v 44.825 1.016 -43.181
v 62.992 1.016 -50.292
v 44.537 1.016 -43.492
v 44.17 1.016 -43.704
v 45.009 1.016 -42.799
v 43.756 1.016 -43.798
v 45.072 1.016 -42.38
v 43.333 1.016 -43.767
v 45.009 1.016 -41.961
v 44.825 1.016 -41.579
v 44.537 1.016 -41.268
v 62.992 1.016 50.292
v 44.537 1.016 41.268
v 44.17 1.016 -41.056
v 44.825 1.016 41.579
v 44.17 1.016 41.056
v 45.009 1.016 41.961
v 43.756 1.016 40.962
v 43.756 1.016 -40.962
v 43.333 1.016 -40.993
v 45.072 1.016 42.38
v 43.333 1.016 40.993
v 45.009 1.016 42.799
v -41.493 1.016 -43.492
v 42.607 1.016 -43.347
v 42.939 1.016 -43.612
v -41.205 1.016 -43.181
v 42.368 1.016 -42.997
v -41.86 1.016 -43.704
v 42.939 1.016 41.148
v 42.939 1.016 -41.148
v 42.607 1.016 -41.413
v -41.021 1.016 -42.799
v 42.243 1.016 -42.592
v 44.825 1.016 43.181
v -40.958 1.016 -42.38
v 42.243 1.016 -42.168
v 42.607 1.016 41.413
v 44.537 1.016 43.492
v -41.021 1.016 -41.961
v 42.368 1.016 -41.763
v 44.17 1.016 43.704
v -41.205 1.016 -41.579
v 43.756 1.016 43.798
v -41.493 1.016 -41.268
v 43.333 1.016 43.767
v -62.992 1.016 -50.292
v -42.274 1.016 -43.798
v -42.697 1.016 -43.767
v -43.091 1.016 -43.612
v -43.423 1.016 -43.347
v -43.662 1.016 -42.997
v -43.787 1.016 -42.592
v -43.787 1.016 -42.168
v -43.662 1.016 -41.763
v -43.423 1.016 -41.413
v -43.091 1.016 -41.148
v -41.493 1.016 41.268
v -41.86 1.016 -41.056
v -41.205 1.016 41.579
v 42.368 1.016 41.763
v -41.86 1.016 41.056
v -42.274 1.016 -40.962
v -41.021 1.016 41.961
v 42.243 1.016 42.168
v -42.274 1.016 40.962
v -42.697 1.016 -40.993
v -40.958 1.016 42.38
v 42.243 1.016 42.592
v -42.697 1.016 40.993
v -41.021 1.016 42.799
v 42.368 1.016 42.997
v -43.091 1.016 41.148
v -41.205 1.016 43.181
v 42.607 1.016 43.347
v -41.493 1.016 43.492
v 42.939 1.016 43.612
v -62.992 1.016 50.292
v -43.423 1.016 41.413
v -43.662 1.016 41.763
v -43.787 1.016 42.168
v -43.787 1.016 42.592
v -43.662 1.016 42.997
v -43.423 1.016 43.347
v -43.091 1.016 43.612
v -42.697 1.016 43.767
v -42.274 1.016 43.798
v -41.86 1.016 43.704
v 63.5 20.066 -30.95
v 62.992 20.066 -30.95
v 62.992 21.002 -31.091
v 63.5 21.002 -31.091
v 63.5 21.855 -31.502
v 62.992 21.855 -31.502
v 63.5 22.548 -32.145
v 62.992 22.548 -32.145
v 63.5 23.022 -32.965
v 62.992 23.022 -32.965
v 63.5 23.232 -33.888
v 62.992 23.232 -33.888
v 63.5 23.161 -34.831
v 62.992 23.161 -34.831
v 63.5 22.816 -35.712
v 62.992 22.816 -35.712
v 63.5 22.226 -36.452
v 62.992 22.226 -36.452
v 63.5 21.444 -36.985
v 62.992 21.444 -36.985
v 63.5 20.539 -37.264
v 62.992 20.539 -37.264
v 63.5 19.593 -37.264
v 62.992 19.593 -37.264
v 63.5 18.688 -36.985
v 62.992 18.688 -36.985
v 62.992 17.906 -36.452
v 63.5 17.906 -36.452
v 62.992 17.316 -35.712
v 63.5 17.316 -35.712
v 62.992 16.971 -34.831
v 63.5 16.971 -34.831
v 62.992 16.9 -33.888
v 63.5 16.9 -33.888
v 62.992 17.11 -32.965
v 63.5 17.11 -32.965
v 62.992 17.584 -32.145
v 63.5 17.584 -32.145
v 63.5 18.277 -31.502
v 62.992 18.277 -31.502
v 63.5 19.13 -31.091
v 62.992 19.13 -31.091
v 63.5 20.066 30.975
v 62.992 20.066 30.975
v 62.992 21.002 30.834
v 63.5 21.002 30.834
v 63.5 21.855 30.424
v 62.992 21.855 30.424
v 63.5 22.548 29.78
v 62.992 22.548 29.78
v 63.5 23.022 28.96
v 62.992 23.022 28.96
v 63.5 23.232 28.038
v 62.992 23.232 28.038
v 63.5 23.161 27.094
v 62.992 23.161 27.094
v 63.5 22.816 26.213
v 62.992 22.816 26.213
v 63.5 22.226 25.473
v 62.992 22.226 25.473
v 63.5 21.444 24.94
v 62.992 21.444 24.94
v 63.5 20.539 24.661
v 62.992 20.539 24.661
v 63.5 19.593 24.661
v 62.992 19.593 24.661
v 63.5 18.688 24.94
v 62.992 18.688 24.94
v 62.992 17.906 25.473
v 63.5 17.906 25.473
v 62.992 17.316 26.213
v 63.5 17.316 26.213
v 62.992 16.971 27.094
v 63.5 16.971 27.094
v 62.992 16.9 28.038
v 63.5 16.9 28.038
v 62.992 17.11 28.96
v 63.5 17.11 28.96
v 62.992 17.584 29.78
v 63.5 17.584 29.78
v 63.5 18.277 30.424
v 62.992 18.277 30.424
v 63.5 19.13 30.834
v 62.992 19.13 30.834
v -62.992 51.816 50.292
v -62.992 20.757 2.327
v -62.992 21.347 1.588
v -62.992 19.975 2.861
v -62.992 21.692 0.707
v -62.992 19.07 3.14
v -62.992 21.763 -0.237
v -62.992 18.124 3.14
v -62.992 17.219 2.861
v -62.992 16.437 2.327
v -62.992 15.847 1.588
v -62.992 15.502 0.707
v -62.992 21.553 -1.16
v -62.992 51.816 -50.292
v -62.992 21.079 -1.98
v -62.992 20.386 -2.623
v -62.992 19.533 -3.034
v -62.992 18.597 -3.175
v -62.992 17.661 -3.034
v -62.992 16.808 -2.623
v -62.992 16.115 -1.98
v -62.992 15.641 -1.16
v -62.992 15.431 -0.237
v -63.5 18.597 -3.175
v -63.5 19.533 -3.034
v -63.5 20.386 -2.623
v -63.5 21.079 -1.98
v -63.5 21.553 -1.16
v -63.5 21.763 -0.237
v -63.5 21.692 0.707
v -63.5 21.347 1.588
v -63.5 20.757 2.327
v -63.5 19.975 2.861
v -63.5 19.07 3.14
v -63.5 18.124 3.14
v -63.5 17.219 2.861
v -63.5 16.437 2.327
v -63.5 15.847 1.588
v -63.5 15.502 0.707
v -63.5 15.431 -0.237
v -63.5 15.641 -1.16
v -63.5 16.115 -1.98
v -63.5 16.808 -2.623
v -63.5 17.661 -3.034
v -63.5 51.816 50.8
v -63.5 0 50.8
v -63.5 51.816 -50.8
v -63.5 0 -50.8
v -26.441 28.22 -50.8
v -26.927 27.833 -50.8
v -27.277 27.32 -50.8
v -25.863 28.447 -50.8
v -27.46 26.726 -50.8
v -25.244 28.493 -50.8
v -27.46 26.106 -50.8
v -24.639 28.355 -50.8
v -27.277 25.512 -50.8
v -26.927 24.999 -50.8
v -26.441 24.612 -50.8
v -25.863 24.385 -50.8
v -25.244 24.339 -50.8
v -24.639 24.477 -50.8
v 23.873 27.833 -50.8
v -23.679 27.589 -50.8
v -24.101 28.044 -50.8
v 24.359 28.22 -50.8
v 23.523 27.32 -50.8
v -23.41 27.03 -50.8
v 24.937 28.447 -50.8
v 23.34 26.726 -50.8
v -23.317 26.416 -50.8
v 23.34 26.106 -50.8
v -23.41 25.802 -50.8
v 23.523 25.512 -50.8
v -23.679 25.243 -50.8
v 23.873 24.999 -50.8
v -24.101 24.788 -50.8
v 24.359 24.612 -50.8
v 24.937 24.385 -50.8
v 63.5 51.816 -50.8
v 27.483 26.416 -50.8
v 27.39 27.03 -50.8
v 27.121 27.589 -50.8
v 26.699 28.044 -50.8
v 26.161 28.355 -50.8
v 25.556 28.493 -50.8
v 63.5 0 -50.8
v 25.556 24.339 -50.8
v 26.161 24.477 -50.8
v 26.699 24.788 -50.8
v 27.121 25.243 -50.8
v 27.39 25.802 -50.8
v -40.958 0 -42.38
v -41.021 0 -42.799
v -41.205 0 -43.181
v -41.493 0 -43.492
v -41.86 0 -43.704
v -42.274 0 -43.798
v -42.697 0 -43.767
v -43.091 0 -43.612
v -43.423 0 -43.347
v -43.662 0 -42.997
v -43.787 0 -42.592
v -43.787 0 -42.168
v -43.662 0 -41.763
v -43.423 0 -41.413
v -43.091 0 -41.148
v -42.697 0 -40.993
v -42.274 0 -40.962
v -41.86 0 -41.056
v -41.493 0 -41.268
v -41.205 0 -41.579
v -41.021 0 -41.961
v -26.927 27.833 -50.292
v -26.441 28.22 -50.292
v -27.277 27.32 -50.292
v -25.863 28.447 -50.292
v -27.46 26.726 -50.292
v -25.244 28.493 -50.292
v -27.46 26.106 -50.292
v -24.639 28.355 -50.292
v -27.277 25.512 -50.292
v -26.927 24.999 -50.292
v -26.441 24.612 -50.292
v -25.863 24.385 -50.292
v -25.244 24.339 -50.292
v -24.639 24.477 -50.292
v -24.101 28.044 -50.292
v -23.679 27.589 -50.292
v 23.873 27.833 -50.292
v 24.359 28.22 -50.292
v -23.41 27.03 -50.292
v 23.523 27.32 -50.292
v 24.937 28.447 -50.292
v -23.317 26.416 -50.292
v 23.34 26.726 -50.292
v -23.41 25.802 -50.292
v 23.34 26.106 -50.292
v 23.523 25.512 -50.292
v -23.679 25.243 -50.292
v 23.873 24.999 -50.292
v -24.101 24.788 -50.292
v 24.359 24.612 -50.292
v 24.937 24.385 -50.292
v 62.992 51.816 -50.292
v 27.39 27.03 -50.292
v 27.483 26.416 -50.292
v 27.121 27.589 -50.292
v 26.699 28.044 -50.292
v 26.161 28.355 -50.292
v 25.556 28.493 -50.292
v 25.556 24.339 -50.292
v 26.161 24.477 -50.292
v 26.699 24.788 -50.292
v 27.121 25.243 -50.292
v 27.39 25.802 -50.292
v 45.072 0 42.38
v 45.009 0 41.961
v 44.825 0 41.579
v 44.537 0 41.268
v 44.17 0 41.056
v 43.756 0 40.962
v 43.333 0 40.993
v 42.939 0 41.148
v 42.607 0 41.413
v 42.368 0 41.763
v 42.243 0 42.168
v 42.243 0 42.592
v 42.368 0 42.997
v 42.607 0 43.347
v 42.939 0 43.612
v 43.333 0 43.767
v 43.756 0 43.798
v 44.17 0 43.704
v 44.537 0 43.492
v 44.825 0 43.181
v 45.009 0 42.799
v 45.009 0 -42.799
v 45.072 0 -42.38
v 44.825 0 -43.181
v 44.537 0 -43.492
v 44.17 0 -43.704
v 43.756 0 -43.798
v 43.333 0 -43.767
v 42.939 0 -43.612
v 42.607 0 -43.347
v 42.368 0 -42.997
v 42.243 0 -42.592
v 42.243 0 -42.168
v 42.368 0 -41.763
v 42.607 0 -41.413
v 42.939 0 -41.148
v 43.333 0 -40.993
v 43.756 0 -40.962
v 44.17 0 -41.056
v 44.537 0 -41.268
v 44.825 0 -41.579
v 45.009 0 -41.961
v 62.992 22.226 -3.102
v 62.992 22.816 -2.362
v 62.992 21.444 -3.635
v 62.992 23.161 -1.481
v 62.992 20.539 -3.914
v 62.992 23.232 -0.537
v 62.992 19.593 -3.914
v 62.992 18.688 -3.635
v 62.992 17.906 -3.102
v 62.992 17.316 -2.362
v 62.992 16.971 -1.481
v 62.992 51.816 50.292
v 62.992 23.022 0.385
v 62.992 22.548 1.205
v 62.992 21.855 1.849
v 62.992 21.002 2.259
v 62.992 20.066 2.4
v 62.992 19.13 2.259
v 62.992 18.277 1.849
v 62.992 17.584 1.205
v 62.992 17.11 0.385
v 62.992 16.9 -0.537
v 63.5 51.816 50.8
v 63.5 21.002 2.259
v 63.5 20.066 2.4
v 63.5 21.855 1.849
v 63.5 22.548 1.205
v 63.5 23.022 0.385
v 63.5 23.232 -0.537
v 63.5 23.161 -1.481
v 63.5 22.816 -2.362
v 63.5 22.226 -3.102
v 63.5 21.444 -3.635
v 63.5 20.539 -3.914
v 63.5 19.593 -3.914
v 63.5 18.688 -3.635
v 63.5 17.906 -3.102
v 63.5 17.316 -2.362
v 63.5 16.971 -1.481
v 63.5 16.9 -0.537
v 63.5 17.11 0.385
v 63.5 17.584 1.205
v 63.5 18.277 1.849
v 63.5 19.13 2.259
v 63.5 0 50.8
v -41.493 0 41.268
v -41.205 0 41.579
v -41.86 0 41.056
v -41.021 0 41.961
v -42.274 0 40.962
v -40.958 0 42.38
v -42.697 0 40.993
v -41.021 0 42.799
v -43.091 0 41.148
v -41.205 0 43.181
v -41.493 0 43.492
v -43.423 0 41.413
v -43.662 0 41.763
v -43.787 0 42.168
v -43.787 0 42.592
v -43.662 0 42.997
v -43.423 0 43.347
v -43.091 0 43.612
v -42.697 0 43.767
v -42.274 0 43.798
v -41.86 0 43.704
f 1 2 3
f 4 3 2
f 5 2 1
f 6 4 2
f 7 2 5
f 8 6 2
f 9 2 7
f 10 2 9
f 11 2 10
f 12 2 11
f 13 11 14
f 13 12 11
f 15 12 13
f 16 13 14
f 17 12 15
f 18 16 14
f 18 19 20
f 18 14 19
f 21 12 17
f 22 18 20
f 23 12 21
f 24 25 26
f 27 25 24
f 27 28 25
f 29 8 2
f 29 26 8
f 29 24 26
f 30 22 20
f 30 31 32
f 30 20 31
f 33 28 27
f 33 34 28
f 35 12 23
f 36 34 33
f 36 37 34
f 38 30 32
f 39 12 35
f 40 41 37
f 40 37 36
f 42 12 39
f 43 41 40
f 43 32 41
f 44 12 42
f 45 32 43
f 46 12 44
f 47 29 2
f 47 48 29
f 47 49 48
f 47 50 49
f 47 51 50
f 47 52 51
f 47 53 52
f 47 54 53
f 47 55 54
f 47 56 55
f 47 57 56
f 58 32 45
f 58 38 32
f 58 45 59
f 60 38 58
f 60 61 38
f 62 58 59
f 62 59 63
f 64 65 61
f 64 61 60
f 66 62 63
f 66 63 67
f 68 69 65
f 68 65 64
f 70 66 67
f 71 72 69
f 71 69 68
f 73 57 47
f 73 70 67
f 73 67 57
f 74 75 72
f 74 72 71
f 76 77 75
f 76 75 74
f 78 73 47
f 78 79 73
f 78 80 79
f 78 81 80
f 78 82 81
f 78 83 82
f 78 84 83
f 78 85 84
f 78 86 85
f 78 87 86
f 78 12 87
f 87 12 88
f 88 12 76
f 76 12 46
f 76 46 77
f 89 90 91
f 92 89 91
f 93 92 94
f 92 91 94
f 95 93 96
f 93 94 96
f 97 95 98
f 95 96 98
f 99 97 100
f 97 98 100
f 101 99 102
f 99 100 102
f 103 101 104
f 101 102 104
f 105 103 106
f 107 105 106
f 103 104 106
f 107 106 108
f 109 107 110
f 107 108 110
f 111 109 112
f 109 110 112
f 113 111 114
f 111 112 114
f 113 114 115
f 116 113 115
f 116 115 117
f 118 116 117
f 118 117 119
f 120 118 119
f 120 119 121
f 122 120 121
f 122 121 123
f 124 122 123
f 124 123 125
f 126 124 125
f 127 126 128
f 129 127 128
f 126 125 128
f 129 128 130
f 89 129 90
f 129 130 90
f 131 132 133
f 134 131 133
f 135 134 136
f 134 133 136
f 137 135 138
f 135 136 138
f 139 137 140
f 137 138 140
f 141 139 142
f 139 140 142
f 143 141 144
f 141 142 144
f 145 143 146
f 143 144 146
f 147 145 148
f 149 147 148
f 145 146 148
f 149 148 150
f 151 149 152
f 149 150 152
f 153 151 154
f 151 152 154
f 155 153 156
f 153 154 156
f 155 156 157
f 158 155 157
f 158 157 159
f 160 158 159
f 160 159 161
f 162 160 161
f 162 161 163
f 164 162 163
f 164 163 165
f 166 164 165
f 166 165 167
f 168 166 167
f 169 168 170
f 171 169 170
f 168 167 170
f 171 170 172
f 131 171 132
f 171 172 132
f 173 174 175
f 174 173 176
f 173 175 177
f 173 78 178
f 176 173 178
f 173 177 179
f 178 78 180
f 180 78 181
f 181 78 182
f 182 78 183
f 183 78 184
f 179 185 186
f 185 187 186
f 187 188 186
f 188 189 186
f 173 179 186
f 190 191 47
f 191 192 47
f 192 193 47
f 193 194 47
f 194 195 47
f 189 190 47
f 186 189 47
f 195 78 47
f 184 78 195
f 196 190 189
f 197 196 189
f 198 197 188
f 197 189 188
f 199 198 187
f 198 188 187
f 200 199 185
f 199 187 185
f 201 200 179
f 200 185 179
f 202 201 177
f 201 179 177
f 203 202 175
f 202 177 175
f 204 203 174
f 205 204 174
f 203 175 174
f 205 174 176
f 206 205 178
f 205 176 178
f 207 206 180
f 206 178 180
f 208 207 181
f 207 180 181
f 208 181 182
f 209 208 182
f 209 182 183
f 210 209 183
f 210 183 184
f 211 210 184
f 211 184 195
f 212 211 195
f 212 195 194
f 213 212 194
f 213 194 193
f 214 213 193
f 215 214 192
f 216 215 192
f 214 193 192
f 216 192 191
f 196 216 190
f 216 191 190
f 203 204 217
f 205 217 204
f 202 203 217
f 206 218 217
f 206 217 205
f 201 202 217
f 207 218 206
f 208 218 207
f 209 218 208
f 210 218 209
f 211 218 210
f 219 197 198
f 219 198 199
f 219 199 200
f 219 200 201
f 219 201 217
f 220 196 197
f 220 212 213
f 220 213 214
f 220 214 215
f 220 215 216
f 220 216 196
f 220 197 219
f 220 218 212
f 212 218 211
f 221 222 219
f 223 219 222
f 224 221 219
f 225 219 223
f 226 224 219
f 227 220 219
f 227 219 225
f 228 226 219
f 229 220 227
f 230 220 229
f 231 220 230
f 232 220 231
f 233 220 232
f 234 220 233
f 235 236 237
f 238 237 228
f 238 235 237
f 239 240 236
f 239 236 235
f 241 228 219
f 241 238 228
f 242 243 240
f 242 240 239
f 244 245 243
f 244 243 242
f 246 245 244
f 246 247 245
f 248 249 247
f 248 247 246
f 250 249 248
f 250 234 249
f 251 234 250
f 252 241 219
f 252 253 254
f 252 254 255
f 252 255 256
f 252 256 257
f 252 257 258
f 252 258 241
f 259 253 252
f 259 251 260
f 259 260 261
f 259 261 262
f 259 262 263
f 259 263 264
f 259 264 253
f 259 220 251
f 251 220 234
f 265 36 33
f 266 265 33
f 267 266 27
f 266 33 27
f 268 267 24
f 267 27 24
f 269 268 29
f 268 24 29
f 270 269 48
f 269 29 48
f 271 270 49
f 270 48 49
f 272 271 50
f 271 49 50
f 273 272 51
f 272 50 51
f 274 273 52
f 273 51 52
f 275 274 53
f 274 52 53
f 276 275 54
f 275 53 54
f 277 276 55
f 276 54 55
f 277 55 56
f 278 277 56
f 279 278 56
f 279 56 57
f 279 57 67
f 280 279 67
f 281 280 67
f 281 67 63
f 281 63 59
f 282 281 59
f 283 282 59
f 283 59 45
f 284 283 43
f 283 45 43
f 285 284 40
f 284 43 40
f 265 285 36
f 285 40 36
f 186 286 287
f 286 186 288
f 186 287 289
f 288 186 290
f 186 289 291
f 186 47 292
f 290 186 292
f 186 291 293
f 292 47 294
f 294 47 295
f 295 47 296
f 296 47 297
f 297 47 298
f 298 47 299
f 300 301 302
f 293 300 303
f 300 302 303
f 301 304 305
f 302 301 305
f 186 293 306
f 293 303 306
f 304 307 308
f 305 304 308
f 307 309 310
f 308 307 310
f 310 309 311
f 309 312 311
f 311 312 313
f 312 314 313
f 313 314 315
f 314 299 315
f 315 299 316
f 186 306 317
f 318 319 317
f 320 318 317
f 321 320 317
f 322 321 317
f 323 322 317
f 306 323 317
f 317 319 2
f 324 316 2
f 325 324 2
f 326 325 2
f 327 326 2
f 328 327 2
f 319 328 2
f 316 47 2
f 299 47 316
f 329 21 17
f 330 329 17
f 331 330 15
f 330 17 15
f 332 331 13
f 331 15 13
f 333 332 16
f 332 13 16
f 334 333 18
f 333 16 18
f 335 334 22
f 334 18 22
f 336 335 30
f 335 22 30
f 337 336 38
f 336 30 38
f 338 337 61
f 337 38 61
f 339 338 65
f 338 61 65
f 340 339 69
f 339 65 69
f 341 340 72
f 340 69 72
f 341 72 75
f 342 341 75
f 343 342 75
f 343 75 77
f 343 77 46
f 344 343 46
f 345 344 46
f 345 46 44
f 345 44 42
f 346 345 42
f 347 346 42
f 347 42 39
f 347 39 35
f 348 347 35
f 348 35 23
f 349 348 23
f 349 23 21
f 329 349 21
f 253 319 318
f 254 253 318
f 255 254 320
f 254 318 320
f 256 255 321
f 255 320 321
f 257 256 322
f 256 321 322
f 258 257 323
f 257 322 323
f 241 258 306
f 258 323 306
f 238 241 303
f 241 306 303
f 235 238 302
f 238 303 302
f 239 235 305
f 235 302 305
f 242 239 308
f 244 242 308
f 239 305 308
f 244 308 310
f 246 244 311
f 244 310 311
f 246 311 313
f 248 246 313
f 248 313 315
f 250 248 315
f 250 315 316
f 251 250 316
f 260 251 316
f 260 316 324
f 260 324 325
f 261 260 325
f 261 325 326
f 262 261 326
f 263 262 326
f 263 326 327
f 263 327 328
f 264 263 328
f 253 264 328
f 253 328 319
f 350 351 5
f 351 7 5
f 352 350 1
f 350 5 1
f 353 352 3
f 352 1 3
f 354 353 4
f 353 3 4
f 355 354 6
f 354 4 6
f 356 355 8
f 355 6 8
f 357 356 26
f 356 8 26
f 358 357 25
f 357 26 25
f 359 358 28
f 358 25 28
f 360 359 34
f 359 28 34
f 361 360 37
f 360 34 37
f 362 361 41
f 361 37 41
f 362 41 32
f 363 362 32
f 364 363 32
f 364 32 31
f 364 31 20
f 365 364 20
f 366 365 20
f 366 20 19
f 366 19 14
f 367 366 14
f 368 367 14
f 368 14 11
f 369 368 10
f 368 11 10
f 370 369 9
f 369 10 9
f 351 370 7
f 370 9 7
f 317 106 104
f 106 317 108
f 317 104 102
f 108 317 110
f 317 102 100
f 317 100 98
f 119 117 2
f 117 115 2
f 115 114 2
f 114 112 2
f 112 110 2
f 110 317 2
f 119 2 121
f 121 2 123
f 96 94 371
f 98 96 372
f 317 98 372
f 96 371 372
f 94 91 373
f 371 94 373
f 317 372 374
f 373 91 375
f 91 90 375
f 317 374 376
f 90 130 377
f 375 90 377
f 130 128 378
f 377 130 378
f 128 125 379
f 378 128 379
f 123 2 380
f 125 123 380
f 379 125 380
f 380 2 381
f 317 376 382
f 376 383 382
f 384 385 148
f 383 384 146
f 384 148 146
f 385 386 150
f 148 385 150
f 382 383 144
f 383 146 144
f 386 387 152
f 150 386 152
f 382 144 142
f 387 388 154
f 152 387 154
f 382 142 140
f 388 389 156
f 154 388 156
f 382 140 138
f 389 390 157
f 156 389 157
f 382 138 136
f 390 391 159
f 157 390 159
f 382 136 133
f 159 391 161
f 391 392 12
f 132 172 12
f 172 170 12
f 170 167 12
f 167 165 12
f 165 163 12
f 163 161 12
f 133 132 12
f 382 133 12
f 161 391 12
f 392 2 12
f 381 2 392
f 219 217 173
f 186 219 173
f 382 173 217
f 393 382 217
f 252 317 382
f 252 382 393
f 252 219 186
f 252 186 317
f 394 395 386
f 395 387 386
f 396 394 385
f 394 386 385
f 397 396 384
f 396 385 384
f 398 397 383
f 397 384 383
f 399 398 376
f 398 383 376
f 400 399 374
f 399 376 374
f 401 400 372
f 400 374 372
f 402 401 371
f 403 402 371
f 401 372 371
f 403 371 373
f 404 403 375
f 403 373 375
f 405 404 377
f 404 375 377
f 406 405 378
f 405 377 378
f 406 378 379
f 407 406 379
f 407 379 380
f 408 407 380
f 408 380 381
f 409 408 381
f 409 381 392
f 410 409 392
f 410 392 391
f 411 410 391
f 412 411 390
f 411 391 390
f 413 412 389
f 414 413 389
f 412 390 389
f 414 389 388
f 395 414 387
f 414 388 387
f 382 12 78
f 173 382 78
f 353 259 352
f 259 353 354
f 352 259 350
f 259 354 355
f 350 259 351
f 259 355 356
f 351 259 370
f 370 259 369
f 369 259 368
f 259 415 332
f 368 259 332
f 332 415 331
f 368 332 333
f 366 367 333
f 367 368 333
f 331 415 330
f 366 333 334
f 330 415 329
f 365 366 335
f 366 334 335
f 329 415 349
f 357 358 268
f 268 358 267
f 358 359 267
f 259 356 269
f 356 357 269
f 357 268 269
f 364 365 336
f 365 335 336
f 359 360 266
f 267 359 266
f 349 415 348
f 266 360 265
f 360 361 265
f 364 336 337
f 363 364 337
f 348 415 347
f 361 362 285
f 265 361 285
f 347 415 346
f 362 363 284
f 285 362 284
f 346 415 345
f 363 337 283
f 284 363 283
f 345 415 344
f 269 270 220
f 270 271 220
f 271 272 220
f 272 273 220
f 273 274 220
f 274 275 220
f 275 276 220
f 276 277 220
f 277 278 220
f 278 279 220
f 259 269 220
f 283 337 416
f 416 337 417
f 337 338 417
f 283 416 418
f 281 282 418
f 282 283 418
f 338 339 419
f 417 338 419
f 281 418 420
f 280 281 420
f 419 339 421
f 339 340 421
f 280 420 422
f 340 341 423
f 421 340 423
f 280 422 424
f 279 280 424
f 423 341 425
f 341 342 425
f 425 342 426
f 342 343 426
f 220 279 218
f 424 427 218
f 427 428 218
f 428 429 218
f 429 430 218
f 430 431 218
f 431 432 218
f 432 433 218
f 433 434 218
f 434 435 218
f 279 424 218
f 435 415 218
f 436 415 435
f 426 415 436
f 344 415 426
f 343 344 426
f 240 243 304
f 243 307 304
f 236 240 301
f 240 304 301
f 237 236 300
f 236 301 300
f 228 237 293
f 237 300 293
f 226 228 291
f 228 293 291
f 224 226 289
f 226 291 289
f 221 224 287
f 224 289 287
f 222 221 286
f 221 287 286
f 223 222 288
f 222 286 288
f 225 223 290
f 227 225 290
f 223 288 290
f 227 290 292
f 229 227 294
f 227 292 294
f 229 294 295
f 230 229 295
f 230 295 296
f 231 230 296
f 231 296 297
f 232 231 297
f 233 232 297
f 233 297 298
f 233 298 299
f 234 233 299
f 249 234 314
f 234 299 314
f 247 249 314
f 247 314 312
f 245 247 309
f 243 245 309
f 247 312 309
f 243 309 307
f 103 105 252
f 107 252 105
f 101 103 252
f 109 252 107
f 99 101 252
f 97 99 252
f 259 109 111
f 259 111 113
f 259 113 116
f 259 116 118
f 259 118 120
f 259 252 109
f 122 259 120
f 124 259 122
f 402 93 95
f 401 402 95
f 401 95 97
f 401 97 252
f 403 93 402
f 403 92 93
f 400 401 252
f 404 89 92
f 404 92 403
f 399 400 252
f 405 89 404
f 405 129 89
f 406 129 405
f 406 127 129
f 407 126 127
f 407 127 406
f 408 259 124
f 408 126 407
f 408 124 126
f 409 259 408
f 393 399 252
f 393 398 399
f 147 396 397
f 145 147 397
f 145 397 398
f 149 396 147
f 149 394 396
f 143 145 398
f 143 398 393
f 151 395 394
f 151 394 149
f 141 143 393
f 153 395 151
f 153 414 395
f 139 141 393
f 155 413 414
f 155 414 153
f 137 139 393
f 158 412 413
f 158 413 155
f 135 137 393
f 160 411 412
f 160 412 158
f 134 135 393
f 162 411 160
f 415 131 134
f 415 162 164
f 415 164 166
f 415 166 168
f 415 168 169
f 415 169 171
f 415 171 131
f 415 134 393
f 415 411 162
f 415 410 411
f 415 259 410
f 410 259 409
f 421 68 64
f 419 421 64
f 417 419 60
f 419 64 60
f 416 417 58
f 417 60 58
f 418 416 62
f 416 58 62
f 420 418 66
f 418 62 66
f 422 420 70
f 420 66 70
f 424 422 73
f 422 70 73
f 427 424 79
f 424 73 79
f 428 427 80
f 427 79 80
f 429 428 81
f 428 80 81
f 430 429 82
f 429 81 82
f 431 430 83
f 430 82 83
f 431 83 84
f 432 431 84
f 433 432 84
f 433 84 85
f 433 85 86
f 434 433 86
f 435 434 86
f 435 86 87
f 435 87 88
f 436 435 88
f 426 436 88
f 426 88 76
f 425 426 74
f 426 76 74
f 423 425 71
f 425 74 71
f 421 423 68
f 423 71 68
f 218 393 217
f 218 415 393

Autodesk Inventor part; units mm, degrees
ref_plane "YZ Plane" through (0, 0, 0) normal (1, 0, 0) x (0, 1, 0)
ref_plane "XZ Plane" through (0, 0, 0) normal (0, 1, 0) x (-1, 0, 0)
ref_plane "XY Plane" through (0, 0, 0) normal (0, 0, 1) x (1, 0, 0)
sketch "Sketch1" plane through (0, 0, 0) normal (0, 1, 0) x (-1, 0, 0)
  line L0 (-63.5, 50.8) -> (63.5, 50.8)
  line L1 (63.5, 50.8) -> (63.5, -50.8)
  line L2 (63.5, -50.8) -> (-63.5, -50.8)
  line L3 (-63.5, -50.8) -> (-63.5, 50.8)
  line L4 (-63.5, 50.8) -> (63.5, -50.8) construction
  line L5 (63.5, 50.8) -> (-63.5, -50.8) construction
  point P0 (0, 0)
  dimension "d0" = 127
  dimension "d1" = 101.6
extrude "Extrusion1" add sketch "Sketch1" along normal blind 1.016
sketch "Sketch2" plane through (0, 1.016, 0) normal (0, 1, 0) x (1, 0, 0)
  line L0 (63.5, 50.8) -> (-63.5, 50.8) projected
  line L1 (63.5, -50.8) -> (-63.5, -50.8)
  line L2 (-63.5, -50.8) -> (-63.5, 50.8)
  line L3 (-63.5, 50.8) -> (63.5, 50.8)
  line L4 (63.5, 50.8) -> (63.5, -50.8)
  line L5 (63.5, -50.8) -> (-63.5, 50.8) construction
  line L6 (-63.5, -50.8) -> (63.5, 50.8) construction
  line L7 (62.992, -50.292) -> (-62.992, -50.292)
  line L8 (-62.992, -50.292) -> (-62.992, 50.292)
  line L9 (-62.992, 50.292) -> (62.992, 50.292)
  line L10 (62.992, 50.292) -> (62.992, -50.292)
  line L11 (62.992, -50.292) -> (-62.992, 50.292) construction
  line L12 (-62.992, -50.292) -> (62.992, 50.292) construction
  point P0 (0, 0)
  dimension "d4" = 125.984
  dimension "d5" = 100.584
extrude "Extrusion2" add sketch "Sketch2" along normal blind 50.8
sketch "Sketch3" plane through (-62.992, 1.016, -50.292) normal (0, 0, 1) x (1, 0, 0)
  line L0 (0, 0) -> (0, 50.8) projected
  circle A0 centre (37.592, 25.4) radius 2.0828
  circle A1 centre (88.392, 25.4) radius 2.0828
  point P0 (62.992, -1.016)
  dimension "d10" = 4.1656
  dimension "d12" = 4.1656
extrude "Extrusion3" cut sketch "Sketch3" against normal through all
sketch "Sketch4" plane through (-62.992, 1.016, 50.292) normal (1, 0, 0) x (0, 0, -1)
  line L0 (0, 0) -> (0, 50.8) projected
  line L1 (0, 17.581) -> (50.292, 17.581)
  circle A0 centre (50.292, 17.581) radius 3.175
  point P0 (50.292, -1.016)
  dimension "d15" = 6.35
extrude "Extrusion4" cut sketch "Sketch4" against normal through all
sketch "Sketch5" plane through (62.992, 1.016, -50.292) normal (-1, 0, 0) x (0, 0, 1)
  line L0 (0, 0) -> (0, 50.8) projected
  line L1 (0, 19.05) -> (0.2921, 19.05)
  line L2 (0, 19.05) -> (0.2921, 19.05) construction
  line L3 (0.2921, 19.05) -> (16.1671, 19.05)
  line L4 (16.1671, 19.05) -> (49.5173, 19.05)
  line L5 (49.5173, 19.05) -> (20.9423, 19.05)
  line L6 (20.9423, 19.05) -> (49.5173, 19.05)
  line L7 (49.5173, 19.05) -> (78.0923, 19.05)
  circle A0 centre (78.0923, 19.05) radius 3.175
  circle A1 centre (49.5173, 19.05) radius 3.175
  circle A2 centre (16.1671, 19.05) radius 3.175
  point P0 (50.292, -1.016)
  dimension "d18" = 0.2921
  dimension "d19" = 0
  dimension "d20" = 15.875
  dimension "d21" = 33.3502
  dimension "d22" = 180
  dimension "d23" = 28.575
  dimension "d24" = 0
  dimension "d25" = 28.575
  dimension "d26" = 6.35
  dimension "d27" = 6.35
  dimension "d28" = 6.35
extrude "Extrusion5" cut sketch "Sketch5" against normal through all
sketch "Sketch6" plane through (0, 1.016, 0) normal (0, 1, 0) x (1, 0, 0)
  line L0 (-50, 50) -> (50, -50) construction
  line L1 (50, 50) -> (-50, -50) construction
  circle A0 centre (43.65, 42.38) radius 1.4224
  circle A1 centre (43.65, -42.38) radius 1.4224
  circle A2 centre (-42.38, -42.38) radius 1.4224
  circle A3 centre (-42.38, 42.38) radius 1.4224
  point P0 (0, 0)
  dimension "d31" = 100
  dimension "d32" = 100
  dimension "d38" = 2.8448
  dimension "d39" = 2.8448
  dimension "d40" = 2.8448
  dimension "d41" = 2.8448
extrude "Extrusion6" cut sketch "Sketch6" against normal through all
properties part number "563-AC-1404-5x4-Enclosure"
